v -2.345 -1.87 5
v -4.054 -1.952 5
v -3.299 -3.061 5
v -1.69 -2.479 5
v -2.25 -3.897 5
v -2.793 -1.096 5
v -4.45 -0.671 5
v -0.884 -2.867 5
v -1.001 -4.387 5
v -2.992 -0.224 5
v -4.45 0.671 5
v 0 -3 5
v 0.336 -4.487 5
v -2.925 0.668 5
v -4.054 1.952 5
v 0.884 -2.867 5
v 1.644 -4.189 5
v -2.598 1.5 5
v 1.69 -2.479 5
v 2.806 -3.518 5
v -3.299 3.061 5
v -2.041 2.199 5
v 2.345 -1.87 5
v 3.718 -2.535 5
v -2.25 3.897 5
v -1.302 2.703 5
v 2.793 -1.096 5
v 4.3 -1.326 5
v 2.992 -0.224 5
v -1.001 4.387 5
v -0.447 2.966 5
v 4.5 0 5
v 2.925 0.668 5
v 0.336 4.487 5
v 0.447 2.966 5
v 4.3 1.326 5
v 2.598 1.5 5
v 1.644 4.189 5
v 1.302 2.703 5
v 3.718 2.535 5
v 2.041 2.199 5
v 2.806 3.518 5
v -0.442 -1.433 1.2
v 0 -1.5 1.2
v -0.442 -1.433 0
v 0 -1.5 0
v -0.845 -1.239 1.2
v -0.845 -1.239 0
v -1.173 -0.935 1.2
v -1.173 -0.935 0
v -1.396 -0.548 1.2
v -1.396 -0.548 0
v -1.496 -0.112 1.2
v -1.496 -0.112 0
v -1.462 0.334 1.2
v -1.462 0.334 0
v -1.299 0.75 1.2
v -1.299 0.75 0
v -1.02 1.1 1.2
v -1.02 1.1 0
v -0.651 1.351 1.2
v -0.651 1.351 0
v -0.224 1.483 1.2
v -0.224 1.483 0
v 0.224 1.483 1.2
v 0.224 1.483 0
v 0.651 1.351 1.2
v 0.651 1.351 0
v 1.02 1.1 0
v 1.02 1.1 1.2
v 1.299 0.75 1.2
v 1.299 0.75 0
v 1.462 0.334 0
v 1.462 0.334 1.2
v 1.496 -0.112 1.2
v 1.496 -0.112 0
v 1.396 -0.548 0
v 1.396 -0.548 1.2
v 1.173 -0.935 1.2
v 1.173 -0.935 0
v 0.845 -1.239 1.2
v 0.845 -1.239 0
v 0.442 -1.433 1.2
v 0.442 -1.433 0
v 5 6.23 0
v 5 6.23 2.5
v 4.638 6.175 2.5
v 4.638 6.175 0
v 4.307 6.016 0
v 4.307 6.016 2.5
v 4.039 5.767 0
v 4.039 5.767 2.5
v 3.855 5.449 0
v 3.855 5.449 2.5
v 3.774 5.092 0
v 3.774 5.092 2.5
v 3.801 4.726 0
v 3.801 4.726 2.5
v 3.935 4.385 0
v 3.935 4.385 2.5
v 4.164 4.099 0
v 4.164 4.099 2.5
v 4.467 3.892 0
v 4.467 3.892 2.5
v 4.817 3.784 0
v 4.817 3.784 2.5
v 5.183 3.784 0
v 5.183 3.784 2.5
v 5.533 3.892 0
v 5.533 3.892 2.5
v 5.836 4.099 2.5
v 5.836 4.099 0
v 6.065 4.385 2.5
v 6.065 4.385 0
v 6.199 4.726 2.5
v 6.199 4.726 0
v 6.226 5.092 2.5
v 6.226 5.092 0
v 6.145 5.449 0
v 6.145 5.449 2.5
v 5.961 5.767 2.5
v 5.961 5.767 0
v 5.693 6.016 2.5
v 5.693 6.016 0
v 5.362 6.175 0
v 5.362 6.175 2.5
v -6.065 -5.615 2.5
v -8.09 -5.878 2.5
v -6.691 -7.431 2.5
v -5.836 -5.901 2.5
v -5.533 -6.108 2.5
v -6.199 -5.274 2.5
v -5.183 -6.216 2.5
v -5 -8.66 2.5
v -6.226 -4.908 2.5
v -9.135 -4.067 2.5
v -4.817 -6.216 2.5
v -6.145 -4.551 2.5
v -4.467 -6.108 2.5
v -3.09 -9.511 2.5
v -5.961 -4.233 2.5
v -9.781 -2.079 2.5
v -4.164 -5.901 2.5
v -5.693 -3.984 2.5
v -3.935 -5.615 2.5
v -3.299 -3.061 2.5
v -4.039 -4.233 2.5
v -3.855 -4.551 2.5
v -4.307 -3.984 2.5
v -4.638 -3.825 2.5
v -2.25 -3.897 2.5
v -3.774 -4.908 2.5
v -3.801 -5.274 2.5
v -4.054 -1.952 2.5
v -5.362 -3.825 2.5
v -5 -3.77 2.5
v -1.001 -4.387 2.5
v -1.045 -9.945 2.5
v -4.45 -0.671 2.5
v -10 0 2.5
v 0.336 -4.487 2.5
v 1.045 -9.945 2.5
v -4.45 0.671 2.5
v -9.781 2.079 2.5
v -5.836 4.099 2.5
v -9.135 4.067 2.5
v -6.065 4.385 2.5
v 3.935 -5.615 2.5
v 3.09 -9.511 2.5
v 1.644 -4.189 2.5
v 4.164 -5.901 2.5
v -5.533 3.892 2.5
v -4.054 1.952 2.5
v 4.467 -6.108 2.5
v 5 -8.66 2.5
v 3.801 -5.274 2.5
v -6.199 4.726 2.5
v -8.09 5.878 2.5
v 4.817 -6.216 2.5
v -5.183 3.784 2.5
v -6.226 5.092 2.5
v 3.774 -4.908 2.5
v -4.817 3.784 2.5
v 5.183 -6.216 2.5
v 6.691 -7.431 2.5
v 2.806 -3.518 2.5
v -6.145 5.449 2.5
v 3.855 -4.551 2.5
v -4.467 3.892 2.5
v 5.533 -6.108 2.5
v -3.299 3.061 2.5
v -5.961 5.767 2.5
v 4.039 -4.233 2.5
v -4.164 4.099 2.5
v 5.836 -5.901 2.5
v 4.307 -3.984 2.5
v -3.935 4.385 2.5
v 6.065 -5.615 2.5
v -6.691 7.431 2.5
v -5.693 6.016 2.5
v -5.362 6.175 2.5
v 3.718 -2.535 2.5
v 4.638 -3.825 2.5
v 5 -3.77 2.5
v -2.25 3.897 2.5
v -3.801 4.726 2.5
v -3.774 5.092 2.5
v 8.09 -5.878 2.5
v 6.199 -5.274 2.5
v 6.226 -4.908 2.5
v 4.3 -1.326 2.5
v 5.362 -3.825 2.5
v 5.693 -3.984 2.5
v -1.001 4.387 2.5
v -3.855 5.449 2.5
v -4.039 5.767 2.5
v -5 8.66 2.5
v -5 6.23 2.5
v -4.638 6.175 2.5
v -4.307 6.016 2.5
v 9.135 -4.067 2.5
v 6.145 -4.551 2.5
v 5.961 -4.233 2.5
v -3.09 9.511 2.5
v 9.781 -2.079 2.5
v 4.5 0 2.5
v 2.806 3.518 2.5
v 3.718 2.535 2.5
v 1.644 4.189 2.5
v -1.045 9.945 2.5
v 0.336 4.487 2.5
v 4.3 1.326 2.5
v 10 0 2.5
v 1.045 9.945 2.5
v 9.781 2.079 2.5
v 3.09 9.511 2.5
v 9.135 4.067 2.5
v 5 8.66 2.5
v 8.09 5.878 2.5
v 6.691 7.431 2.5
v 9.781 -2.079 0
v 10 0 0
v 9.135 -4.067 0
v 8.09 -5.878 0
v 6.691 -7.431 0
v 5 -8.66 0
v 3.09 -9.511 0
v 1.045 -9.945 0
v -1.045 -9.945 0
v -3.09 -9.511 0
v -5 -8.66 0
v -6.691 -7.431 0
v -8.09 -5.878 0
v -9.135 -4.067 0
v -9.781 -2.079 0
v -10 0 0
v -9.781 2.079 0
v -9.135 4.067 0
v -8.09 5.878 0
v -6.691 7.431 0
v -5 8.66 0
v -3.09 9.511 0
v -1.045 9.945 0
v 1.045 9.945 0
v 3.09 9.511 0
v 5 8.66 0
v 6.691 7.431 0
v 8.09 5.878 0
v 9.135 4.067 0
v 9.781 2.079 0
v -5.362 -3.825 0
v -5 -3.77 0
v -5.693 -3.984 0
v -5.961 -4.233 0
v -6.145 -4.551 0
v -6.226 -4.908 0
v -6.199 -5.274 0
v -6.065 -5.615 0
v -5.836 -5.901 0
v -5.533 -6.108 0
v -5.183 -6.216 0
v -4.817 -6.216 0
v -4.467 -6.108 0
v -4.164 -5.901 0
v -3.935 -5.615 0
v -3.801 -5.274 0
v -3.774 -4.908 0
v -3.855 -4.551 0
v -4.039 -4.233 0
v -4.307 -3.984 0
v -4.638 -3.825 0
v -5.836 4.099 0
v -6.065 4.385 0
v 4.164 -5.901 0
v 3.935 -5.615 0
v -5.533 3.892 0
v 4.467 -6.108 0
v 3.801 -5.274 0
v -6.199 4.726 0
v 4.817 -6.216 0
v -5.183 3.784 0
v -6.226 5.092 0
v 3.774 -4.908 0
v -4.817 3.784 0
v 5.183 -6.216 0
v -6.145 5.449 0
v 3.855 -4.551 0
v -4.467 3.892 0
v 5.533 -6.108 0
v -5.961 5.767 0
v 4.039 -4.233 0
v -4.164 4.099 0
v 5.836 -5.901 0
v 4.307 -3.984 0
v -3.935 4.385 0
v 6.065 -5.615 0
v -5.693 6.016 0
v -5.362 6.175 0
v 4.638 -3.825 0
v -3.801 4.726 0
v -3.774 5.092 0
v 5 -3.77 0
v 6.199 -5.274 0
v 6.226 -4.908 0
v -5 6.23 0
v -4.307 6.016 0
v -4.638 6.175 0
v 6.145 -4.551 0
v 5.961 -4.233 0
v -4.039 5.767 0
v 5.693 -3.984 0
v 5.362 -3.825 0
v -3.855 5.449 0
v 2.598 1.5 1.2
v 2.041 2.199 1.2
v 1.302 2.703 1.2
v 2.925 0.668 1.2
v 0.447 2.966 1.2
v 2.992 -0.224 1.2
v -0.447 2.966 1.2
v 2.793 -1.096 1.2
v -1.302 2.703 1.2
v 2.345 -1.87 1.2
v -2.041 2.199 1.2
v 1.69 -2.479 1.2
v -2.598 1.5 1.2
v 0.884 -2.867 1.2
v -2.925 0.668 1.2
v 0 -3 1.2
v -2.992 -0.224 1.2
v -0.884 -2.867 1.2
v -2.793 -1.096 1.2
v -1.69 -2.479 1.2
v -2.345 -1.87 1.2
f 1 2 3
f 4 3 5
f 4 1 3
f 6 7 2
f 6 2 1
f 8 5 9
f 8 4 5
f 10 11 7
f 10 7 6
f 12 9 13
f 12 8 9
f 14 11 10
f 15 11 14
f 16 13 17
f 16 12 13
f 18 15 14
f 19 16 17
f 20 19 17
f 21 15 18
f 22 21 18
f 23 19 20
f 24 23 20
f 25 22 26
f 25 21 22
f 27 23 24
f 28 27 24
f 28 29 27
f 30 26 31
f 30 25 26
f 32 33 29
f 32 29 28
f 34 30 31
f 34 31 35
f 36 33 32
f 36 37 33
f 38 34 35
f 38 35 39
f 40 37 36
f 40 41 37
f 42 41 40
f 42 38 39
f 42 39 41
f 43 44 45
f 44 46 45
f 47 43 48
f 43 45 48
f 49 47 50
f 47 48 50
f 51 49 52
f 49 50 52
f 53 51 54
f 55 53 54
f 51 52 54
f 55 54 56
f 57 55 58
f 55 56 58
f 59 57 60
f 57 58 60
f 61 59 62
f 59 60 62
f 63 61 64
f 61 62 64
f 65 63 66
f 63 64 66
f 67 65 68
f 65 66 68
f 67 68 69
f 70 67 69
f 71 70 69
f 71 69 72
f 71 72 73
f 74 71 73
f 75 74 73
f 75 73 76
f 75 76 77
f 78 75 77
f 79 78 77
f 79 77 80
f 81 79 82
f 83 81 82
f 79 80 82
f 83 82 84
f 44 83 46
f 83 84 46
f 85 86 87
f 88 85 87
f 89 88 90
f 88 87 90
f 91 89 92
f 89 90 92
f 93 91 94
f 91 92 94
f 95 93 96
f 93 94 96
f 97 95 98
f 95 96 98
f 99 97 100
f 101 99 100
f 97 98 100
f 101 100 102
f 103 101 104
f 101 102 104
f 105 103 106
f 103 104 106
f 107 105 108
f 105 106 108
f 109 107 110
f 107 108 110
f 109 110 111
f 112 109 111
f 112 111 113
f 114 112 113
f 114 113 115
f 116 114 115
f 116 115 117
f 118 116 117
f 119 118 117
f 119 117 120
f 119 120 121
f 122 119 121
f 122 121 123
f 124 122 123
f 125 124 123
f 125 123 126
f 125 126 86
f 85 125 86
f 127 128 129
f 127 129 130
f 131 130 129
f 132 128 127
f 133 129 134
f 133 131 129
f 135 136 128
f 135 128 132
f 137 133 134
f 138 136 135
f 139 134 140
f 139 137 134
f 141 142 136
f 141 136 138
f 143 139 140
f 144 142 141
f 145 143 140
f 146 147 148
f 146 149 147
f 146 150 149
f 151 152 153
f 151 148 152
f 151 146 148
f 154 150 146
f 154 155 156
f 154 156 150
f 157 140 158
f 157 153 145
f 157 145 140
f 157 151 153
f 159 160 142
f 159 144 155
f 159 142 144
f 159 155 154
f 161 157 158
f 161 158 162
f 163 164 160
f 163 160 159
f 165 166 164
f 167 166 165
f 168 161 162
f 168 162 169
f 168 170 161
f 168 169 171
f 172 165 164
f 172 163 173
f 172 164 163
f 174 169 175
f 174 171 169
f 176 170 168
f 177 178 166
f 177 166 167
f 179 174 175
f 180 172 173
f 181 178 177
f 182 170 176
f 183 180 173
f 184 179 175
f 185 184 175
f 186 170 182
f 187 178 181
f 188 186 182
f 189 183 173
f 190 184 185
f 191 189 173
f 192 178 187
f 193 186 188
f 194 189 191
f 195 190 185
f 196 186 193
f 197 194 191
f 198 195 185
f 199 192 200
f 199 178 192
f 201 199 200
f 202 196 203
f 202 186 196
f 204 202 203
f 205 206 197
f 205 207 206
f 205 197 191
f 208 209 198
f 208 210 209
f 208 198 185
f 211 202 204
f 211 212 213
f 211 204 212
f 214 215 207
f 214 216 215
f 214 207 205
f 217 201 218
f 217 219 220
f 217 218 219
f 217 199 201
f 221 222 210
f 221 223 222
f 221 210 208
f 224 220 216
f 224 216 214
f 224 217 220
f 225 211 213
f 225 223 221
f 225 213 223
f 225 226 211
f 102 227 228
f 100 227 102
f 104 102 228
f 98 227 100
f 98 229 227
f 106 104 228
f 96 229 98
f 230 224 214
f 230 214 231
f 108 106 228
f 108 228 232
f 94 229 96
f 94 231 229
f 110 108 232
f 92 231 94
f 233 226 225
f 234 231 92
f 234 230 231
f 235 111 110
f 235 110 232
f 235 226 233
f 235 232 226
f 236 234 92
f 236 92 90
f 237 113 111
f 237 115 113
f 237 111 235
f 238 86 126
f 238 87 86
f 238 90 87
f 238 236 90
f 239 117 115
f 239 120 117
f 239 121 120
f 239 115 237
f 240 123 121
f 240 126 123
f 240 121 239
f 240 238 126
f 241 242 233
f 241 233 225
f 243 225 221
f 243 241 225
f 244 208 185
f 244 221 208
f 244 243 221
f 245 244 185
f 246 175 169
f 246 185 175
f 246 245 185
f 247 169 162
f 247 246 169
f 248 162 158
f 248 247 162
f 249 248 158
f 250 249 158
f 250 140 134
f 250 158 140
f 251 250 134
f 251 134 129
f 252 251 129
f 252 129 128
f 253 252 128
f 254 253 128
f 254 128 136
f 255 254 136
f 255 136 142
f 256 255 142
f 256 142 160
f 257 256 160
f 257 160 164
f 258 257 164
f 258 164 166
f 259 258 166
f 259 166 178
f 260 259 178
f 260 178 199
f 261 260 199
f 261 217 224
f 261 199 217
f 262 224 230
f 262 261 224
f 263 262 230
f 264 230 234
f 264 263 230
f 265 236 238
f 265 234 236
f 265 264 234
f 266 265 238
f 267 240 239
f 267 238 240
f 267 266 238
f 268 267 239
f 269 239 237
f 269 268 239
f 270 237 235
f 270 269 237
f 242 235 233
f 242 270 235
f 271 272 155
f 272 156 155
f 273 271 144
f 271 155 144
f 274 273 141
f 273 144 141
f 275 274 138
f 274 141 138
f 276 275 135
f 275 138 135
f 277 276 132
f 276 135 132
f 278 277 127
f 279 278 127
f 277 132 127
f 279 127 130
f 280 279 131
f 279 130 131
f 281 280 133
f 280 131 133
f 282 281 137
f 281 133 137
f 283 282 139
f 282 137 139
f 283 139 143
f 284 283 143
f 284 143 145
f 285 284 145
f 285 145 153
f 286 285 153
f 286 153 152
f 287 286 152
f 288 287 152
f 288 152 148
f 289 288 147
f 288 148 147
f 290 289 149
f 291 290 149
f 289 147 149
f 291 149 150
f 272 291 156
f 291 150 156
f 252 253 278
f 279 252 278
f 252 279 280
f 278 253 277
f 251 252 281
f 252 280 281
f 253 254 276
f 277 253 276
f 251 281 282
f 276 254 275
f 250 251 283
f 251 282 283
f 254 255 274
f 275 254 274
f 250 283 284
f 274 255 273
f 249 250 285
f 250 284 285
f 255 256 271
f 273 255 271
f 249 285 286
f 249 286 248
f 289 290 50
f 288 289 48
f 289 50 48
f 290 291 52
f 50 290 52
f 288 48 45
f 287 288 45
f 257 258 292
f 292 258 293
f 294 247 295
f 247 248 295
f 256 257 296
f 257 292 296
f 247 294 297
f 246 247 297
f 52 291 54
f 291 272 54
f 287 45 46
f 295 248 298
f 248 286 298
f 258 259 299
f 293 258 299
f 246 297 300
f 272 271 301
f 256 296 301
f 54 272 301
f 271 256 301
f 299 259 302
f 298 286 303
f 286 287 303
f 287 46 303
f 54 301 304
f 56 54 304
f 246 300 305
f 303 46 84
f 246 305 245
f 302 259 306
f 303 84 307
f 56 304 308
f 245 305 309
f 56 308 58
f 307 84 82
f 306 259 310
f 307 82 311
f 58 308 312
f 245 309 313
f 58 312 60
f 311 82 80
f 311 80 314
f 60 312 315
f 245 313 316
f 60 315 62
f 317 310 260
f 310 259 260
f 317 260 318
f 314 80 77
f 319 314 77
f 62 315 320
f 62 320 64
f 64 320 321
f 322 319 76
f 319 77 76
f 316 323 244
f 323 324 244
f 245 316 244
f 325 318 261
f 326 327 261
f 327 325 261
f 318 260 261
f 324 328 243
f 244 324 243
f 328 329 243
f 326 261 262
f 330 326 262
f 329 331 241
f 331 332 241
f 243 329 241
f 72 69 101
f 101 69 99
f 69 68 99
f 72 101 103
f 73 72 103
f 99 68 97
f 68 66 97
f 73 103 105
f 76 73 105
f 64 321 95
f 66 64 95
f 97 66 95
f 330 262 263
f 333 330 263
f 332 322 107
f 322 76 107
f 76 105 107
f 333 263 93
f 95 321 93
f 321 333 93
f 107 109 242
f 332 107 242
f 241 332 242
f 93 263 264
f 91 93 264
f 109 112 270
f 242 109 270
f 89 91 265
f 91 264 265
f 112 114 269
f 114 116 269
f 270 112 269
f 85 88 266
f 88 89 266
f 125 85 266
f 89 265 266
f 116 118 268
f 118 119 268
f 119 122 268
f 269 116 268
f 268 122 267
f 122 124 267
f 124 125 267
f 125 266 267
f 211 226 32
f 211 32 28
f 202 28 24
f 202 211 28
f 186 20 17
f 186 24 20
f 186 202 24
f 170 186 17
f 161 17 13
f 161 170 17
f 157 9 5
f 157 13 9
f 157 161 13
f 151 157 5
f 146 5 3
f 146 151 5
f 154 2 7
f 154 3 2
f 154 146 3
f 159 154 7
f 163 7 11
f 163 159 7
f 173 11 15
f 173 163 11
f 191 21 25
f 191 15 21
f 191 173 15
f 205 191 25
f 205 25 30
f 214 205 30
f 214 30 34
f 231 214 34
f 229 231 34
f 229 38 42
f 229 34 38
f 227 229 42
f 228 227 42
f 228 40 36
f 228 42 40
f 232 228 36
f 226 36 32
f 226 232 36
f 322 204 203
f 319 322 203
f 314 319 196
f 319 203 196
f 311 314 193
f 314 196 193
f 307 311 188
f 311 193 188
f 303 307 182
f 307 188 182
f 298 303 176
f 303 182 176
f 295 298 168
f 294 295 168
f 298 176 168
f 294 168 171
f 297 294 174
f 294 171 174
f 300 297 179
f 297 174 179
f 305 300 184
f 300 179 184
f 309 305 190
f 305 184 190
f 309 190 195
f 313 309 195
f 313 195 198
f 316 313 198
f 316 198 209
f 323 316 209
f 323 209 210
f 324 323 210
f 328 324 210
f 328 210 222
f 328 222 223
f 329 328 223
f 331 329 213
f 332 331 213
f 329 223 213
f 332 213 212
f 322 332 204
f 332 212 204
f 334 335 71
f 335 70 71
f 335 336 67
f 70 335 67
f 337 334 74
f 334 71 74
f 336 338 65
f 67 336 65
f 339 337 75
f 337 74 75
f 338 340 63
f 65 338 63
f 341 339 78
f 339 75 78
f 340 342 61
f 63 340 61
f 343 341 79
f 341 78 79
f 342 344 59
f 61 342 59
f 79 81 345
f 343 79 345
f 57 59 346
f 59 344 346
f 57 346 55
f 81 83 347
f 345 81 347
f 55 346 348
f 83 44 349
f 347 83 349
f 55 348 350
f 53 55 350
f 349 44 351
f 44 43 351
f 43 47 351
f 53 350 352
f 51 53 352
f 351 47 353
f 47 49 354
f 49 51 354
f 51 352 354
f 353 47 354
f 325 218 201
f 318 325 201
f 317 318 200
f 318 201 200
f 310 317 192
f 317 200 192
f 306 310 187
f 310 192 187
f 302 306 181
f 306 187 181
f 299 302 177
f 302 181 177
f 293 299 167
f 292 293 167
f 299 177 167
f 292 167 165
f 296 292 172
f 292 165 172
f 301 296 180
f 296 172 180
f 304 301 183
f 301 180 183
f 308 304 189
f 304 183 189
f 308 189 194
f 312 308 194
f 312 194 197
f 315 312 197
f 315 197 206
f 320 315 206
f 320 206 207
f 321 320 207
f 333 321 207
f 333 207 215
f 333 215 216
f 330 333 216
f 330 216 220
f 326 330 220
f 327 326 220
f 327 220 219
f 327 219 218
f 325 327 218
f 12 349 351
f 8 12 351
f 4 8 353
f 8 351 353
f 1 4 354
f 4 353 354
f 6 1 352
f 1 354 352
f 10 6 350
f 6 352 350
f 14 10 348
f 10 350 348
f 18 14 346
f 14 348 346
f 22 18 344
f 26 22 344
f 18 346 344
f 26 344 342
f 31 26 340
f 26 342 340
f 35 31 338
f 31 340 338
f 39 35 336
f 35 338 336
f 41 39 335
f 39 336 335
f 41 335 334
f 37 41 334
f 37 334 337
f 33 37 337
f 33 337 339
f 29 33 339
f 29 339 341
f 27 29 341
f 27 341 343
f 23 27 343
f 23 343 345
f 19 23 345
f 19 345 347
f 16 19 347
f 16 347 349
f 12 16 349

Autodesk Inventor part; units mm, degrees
ref_plane "YZ Plane" through (0, 0, 0) normal (1, 0, 0) x (0, 1, 0)
ref_plane "XZ Plane" through (0, 0, 0) normal (0, 1, 0) x (-1, 0, 0)
ref_plane "XY Plane" through (0, 0, 0) normal (0, 0, 1) x (1, 0, 0)
sketch "スケッチ1" plane through (0, 0, 0) normal (0, 0, 1) x (1, 0, 0)
  circle A0 centre (0, 0) radius 10
  dimension "d0" = 20
extrude "押し出し1" add sketch "スケッチ1" along normal blind 2.5
sketch "スケッチ2" plane through (0, 0, 2.5) normal (0, 0, 1) x (1, 0, 0)
  circle A0 centre (0, 0) radius 4.5
  dimension "d3" = 9
extrude "押し出し2" add sketch "スケッチ2" along normal blind 2.5
sketch "スケッチ3" plane through (0, 0, 0) normal (0, 0, -1) x (-1, 0, 0)
  circle A0 centre (0, 0) radius 10 projected
  line L0 (0, 10) -> (0, -10)
  line L1 (-10, 0) -> (10, 0)
  point P0 (-5, 5)
  point P1 (5, 5)
  point P2 (5, -5)
  point P3 (-5, -5)
  dimension "d6" = 10
  dimension "d7" = 10
hole "穴1" at (5, 5, 0) at (-5, 5, 0) at (-5, -5, 0) at (5, -5, 0) direction (0, 0, 1) diameter 2.459 end through all thread size "M3x0.5" class "6H" standard "ISO Metric profile"
sketch "スケッチ4" plane through (0, 0, 5) normal (0, 0, -1) x (-1, 0, 0)
  point P0 (0, 0)
  point P1 (0, 0)
hole "穴2" at (0, 0, 5) direction (0, 0, -1) diameter 3 end through all counterbore diameter 6 counterbore depth 3.8
properties part number "サーボモータ25kgcmサーボホーン1" material "アルミニウム 6061"
